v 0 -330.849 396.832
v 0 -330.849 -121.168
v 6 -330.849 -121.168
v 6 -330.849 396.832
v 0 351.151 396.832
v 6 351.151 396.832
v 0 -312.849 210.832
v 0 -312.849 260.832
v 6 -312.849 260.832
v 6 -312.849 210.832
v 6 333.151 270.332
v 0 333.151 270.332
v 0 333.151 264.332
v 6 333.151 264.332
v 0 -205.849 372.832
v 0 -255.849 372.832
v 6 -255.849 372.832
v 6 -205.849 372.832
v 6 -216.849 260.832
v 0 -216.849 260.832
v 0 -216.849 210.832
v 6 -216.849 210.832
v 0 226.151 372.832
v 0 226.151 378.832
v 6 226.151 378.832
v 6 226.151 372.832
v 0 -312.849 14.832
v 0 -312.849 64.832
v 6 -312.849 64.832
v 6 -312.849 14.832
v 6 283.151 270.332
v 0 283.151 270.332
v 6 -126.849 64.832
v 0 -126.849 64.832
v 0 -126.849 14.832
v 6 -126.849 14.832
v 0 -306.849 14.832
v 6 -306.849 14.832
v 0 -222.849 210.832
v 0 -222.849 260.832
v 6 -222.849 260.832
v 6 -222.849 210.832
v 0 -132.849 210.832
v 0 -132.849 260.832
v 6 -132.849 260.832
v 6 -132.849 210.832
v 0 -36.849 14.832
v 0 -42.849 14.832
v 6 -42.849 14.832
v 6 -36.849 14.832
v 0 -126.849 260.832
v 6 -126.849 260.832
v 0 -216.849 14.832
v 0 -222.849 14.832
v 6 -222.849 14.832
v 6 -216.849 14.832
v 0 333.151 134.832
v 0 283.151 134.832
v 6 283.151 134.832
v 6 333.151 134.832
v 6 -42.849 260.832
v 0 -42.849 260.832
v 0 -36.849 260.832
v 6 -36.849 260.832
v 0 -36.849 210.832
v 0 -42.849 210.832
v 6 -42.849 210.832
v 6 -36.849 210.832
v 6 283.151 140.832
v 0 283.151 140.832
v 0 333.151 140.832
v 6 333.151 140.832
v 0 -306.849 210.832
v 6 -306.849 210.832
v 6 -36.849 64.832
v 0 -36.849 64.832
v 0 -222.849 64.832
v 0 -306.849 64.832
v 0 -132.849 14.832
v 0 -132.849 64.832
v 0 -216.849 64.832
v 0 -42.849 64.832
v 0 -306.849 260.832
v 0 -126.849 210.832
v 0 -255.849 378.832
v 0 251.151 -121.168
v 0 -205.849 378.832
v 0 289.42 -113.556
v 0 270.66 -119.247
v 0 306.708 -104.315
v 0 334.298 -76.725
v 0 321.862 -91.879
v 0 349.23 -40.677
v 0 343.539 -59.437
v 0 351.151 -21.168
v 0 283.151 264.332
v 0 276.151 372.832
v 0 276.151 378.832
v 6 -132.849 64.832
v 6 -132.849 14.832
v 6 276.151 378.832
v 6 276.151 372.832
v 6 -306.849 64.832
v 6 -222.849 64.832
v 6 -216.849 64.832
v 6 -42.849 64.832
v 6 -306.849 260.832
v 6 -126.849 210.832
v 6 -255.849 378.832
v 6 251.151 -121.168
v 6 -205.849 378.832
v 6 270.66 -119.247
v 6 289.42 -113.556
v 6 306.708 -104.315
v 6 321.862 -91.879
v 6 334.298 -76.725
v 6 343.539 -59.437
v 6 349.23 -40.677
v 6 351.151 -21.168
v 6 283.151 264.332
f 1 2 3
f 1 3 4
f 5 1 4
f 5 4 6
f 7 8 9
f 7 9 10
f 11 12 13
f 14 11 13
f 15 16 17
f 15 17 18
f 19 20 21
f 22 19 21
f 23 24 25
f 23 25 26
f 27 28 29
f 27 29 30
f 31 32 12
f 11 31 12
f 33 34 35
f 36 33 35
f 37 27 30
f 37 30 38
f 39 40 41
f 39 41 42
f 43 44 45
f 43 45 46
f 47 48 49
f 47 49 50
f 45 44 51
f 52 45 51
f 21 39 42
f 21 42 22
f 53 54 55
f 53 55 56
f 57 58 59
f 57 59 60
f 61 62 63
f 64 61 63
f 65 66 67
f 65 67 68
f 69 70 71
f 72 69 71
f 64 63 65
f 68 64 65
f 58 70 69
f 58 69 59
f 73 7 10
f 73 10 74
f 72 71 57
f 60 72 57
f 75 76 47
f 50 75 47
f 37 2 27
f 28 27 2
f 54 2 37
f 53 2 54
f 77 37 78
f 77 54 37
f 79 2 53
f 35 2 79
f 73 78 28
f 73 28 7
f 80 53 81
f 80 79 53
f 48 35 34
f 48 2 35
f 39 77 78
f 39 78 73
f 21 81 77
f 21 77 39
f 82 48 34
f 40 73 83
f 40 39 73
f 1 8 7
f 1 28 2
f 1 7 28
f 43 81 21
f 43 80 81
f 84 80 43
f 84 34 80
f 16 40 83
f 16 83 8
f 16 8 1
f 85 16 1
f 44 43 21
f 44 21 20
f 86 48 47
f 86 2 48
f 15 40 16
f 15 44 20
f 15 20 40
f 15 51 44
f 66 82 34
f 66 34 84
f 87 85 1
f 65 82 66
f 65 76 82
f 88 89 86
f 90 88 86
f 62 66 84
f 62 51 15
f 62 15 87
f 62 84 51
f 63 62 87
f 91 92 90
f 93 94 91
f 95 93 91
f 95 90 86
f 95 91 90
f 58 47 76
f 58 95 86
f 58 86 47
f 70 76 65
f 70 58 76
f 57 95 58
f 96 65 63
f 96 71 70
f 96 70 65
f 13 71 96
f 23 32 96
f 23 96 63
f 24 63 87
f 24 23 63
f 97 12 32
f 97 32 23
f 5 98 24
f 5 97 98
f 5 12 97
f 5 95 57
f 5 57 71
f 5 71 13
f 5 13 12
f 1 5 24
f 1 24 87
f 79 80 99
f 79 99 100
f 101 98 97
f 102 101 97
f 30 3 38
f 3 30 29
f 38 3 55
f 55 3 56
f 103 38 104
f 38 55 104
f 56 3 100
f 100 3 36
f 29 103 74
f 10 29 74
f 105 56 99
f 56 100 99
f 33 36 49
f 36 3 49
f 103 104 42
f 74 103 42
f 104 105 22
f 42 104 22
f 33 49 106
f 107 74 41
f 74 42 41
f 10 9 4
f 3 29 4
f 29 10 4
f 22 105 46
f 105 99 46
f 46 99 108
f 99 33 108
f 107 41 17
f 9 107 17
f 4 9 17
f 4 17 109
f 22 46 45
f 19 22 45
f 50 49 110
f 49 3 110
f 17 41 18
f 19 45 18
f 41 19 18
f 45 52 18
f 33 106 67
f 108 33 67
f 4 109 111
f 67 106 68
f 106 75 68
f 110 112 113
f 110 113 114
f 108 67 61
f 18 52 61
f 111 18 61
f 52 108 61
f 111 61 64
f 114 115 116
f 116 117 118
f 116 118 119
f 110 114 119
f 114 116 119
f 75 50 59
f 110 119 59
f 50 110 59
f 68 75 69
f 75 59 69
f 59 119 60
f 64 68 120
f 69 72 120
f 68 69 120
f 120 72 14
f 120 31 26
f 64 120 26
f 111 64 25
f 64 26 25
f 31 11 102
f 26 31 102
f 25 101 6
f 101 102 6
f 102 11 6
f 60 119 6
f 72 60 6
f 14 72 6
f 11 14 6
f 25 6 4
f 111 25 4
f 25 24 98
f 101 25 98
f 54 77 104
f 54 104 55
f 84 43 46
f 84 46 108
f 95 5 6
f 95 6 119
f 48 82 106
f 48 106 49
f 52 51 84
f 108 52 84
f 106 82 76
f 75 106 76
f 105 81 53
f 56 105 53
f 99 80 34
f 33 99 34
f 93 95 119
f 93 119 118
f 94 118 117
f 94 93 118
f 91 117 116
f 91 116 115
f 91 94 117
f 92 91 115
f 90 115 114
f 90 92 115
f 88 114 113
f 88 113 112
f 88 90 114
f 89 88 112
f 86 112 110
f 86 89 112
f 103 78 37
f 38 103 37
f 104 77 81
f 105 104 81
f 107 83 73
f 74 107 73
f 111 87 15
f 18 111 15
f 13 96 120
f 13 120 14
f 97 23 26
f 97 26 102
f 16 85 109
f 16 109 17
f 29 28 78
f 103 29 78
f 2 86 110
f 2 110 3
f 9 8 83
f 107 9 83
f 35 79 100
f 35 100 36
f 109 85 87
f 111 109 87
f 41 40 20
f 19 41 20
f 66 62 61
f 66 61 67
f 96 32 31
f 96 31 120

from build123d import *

# Parameters (mm, degrees)
SKETCH1_W           = 6
SKETCH1_H           = 50
SKETCH1_W_2         = 50
SKETCH1_H_2         = 6
BOSS_EXTRUDE1_DEPTH = 6


with BuildPart() as part:
    # Sketch1 → Boss-Extrude1 (new body)
    with BuildSketch(Plane(origin=(0, 0, 0), x_dir=(0, 0, -1), z_dir=(1, 0, 0))):
        with BuildLine():
            Line((-396.831767264, 351.151199882), (21.168232736, 351.151199882))
            ThreePointArc((21.168232736, 351.151199882), (91.878910855, 321.861878001), (121.168232736, 251.151199882))
            Line((121.168232736, 251.151199882), (121.168232736, -330.848800118))
            Line((121.168232736, -330.848800118), (-396.831767264, -330.848800118))
            Line((-396.831767264, -330.848800118), (-396.831767264, 351.151199882))
        make_face()
        with Locations((-375.831767264, 251.151199882)):
            Rectangle(SKETCH1_W, SKETCH1_H, mode=Mode.SUBTRACT)
        with Locations((-375.831767264, -230.848800118)):
            Rectangle(SKETCH1_W, SKETCH1_H, mode=Mode.SUBTRACT)
        with Locations((-235.831767264, -309.848800118)):
            Rectangle(SKETCH1_W_2, SKETCH1_H_2, mode=Mode.SUBTRACT)
        with Locations((-39.831767264, -309.848800118)):
            Rectangle(SKETCH1_W_2, SKETCH1_H_2, mode=Mode.SUBTRACT)
        with Locations((-235.831767264, -219.848800118)):
            Rectangle(SKETCH1_W_2, SKETCH1_H_2, mode=Mode.SUBTRACT)
        with Locations((-39.831767264, -219.848800118)):
            Rectangle(SKETCH1_W_2, SKETCH1_H_2, mode=Mode.SUBTRACT)
        with Locations((-235.831767264, -129.848800118)):
            Rectangle(SKETCH1_W_2, SKETCH1_H_2, mode=Mode.SUBTRACT)
        with Locations((-39.831767264, -129.848800118)):
            Rectangle(SKETCH1_W_2, SKETCH1_H_2, mode=Mode.SUBTRACT)
        with Locations((-235.831767264, -39.848800118)):
            Rectangle(SKETCH1_W_2, SKETCH1_H_2, mode=Mode.SUBTRACT)
        with Locations((-39.831767264, -39.848800118)):
            Rectangle(SKETCH1_W_2, SKETCH1_H_2, mode=Mode.SUBTRACT)
        with Locations((-267.331767264, 308.151199882)):
            Rectangle(SKETCH1_W, SKETCH1_H, mode=Mode.SUBTRACT)
        with Locations((-137.831767264, 308.151199882)):
            Rectangle(SKETCH1_W, SKETCH1_H, mode=Mode.SUBTRACT)
    extrude(amount=BOSS_EXTRUDE1_DEPTH)


solid = part.part
